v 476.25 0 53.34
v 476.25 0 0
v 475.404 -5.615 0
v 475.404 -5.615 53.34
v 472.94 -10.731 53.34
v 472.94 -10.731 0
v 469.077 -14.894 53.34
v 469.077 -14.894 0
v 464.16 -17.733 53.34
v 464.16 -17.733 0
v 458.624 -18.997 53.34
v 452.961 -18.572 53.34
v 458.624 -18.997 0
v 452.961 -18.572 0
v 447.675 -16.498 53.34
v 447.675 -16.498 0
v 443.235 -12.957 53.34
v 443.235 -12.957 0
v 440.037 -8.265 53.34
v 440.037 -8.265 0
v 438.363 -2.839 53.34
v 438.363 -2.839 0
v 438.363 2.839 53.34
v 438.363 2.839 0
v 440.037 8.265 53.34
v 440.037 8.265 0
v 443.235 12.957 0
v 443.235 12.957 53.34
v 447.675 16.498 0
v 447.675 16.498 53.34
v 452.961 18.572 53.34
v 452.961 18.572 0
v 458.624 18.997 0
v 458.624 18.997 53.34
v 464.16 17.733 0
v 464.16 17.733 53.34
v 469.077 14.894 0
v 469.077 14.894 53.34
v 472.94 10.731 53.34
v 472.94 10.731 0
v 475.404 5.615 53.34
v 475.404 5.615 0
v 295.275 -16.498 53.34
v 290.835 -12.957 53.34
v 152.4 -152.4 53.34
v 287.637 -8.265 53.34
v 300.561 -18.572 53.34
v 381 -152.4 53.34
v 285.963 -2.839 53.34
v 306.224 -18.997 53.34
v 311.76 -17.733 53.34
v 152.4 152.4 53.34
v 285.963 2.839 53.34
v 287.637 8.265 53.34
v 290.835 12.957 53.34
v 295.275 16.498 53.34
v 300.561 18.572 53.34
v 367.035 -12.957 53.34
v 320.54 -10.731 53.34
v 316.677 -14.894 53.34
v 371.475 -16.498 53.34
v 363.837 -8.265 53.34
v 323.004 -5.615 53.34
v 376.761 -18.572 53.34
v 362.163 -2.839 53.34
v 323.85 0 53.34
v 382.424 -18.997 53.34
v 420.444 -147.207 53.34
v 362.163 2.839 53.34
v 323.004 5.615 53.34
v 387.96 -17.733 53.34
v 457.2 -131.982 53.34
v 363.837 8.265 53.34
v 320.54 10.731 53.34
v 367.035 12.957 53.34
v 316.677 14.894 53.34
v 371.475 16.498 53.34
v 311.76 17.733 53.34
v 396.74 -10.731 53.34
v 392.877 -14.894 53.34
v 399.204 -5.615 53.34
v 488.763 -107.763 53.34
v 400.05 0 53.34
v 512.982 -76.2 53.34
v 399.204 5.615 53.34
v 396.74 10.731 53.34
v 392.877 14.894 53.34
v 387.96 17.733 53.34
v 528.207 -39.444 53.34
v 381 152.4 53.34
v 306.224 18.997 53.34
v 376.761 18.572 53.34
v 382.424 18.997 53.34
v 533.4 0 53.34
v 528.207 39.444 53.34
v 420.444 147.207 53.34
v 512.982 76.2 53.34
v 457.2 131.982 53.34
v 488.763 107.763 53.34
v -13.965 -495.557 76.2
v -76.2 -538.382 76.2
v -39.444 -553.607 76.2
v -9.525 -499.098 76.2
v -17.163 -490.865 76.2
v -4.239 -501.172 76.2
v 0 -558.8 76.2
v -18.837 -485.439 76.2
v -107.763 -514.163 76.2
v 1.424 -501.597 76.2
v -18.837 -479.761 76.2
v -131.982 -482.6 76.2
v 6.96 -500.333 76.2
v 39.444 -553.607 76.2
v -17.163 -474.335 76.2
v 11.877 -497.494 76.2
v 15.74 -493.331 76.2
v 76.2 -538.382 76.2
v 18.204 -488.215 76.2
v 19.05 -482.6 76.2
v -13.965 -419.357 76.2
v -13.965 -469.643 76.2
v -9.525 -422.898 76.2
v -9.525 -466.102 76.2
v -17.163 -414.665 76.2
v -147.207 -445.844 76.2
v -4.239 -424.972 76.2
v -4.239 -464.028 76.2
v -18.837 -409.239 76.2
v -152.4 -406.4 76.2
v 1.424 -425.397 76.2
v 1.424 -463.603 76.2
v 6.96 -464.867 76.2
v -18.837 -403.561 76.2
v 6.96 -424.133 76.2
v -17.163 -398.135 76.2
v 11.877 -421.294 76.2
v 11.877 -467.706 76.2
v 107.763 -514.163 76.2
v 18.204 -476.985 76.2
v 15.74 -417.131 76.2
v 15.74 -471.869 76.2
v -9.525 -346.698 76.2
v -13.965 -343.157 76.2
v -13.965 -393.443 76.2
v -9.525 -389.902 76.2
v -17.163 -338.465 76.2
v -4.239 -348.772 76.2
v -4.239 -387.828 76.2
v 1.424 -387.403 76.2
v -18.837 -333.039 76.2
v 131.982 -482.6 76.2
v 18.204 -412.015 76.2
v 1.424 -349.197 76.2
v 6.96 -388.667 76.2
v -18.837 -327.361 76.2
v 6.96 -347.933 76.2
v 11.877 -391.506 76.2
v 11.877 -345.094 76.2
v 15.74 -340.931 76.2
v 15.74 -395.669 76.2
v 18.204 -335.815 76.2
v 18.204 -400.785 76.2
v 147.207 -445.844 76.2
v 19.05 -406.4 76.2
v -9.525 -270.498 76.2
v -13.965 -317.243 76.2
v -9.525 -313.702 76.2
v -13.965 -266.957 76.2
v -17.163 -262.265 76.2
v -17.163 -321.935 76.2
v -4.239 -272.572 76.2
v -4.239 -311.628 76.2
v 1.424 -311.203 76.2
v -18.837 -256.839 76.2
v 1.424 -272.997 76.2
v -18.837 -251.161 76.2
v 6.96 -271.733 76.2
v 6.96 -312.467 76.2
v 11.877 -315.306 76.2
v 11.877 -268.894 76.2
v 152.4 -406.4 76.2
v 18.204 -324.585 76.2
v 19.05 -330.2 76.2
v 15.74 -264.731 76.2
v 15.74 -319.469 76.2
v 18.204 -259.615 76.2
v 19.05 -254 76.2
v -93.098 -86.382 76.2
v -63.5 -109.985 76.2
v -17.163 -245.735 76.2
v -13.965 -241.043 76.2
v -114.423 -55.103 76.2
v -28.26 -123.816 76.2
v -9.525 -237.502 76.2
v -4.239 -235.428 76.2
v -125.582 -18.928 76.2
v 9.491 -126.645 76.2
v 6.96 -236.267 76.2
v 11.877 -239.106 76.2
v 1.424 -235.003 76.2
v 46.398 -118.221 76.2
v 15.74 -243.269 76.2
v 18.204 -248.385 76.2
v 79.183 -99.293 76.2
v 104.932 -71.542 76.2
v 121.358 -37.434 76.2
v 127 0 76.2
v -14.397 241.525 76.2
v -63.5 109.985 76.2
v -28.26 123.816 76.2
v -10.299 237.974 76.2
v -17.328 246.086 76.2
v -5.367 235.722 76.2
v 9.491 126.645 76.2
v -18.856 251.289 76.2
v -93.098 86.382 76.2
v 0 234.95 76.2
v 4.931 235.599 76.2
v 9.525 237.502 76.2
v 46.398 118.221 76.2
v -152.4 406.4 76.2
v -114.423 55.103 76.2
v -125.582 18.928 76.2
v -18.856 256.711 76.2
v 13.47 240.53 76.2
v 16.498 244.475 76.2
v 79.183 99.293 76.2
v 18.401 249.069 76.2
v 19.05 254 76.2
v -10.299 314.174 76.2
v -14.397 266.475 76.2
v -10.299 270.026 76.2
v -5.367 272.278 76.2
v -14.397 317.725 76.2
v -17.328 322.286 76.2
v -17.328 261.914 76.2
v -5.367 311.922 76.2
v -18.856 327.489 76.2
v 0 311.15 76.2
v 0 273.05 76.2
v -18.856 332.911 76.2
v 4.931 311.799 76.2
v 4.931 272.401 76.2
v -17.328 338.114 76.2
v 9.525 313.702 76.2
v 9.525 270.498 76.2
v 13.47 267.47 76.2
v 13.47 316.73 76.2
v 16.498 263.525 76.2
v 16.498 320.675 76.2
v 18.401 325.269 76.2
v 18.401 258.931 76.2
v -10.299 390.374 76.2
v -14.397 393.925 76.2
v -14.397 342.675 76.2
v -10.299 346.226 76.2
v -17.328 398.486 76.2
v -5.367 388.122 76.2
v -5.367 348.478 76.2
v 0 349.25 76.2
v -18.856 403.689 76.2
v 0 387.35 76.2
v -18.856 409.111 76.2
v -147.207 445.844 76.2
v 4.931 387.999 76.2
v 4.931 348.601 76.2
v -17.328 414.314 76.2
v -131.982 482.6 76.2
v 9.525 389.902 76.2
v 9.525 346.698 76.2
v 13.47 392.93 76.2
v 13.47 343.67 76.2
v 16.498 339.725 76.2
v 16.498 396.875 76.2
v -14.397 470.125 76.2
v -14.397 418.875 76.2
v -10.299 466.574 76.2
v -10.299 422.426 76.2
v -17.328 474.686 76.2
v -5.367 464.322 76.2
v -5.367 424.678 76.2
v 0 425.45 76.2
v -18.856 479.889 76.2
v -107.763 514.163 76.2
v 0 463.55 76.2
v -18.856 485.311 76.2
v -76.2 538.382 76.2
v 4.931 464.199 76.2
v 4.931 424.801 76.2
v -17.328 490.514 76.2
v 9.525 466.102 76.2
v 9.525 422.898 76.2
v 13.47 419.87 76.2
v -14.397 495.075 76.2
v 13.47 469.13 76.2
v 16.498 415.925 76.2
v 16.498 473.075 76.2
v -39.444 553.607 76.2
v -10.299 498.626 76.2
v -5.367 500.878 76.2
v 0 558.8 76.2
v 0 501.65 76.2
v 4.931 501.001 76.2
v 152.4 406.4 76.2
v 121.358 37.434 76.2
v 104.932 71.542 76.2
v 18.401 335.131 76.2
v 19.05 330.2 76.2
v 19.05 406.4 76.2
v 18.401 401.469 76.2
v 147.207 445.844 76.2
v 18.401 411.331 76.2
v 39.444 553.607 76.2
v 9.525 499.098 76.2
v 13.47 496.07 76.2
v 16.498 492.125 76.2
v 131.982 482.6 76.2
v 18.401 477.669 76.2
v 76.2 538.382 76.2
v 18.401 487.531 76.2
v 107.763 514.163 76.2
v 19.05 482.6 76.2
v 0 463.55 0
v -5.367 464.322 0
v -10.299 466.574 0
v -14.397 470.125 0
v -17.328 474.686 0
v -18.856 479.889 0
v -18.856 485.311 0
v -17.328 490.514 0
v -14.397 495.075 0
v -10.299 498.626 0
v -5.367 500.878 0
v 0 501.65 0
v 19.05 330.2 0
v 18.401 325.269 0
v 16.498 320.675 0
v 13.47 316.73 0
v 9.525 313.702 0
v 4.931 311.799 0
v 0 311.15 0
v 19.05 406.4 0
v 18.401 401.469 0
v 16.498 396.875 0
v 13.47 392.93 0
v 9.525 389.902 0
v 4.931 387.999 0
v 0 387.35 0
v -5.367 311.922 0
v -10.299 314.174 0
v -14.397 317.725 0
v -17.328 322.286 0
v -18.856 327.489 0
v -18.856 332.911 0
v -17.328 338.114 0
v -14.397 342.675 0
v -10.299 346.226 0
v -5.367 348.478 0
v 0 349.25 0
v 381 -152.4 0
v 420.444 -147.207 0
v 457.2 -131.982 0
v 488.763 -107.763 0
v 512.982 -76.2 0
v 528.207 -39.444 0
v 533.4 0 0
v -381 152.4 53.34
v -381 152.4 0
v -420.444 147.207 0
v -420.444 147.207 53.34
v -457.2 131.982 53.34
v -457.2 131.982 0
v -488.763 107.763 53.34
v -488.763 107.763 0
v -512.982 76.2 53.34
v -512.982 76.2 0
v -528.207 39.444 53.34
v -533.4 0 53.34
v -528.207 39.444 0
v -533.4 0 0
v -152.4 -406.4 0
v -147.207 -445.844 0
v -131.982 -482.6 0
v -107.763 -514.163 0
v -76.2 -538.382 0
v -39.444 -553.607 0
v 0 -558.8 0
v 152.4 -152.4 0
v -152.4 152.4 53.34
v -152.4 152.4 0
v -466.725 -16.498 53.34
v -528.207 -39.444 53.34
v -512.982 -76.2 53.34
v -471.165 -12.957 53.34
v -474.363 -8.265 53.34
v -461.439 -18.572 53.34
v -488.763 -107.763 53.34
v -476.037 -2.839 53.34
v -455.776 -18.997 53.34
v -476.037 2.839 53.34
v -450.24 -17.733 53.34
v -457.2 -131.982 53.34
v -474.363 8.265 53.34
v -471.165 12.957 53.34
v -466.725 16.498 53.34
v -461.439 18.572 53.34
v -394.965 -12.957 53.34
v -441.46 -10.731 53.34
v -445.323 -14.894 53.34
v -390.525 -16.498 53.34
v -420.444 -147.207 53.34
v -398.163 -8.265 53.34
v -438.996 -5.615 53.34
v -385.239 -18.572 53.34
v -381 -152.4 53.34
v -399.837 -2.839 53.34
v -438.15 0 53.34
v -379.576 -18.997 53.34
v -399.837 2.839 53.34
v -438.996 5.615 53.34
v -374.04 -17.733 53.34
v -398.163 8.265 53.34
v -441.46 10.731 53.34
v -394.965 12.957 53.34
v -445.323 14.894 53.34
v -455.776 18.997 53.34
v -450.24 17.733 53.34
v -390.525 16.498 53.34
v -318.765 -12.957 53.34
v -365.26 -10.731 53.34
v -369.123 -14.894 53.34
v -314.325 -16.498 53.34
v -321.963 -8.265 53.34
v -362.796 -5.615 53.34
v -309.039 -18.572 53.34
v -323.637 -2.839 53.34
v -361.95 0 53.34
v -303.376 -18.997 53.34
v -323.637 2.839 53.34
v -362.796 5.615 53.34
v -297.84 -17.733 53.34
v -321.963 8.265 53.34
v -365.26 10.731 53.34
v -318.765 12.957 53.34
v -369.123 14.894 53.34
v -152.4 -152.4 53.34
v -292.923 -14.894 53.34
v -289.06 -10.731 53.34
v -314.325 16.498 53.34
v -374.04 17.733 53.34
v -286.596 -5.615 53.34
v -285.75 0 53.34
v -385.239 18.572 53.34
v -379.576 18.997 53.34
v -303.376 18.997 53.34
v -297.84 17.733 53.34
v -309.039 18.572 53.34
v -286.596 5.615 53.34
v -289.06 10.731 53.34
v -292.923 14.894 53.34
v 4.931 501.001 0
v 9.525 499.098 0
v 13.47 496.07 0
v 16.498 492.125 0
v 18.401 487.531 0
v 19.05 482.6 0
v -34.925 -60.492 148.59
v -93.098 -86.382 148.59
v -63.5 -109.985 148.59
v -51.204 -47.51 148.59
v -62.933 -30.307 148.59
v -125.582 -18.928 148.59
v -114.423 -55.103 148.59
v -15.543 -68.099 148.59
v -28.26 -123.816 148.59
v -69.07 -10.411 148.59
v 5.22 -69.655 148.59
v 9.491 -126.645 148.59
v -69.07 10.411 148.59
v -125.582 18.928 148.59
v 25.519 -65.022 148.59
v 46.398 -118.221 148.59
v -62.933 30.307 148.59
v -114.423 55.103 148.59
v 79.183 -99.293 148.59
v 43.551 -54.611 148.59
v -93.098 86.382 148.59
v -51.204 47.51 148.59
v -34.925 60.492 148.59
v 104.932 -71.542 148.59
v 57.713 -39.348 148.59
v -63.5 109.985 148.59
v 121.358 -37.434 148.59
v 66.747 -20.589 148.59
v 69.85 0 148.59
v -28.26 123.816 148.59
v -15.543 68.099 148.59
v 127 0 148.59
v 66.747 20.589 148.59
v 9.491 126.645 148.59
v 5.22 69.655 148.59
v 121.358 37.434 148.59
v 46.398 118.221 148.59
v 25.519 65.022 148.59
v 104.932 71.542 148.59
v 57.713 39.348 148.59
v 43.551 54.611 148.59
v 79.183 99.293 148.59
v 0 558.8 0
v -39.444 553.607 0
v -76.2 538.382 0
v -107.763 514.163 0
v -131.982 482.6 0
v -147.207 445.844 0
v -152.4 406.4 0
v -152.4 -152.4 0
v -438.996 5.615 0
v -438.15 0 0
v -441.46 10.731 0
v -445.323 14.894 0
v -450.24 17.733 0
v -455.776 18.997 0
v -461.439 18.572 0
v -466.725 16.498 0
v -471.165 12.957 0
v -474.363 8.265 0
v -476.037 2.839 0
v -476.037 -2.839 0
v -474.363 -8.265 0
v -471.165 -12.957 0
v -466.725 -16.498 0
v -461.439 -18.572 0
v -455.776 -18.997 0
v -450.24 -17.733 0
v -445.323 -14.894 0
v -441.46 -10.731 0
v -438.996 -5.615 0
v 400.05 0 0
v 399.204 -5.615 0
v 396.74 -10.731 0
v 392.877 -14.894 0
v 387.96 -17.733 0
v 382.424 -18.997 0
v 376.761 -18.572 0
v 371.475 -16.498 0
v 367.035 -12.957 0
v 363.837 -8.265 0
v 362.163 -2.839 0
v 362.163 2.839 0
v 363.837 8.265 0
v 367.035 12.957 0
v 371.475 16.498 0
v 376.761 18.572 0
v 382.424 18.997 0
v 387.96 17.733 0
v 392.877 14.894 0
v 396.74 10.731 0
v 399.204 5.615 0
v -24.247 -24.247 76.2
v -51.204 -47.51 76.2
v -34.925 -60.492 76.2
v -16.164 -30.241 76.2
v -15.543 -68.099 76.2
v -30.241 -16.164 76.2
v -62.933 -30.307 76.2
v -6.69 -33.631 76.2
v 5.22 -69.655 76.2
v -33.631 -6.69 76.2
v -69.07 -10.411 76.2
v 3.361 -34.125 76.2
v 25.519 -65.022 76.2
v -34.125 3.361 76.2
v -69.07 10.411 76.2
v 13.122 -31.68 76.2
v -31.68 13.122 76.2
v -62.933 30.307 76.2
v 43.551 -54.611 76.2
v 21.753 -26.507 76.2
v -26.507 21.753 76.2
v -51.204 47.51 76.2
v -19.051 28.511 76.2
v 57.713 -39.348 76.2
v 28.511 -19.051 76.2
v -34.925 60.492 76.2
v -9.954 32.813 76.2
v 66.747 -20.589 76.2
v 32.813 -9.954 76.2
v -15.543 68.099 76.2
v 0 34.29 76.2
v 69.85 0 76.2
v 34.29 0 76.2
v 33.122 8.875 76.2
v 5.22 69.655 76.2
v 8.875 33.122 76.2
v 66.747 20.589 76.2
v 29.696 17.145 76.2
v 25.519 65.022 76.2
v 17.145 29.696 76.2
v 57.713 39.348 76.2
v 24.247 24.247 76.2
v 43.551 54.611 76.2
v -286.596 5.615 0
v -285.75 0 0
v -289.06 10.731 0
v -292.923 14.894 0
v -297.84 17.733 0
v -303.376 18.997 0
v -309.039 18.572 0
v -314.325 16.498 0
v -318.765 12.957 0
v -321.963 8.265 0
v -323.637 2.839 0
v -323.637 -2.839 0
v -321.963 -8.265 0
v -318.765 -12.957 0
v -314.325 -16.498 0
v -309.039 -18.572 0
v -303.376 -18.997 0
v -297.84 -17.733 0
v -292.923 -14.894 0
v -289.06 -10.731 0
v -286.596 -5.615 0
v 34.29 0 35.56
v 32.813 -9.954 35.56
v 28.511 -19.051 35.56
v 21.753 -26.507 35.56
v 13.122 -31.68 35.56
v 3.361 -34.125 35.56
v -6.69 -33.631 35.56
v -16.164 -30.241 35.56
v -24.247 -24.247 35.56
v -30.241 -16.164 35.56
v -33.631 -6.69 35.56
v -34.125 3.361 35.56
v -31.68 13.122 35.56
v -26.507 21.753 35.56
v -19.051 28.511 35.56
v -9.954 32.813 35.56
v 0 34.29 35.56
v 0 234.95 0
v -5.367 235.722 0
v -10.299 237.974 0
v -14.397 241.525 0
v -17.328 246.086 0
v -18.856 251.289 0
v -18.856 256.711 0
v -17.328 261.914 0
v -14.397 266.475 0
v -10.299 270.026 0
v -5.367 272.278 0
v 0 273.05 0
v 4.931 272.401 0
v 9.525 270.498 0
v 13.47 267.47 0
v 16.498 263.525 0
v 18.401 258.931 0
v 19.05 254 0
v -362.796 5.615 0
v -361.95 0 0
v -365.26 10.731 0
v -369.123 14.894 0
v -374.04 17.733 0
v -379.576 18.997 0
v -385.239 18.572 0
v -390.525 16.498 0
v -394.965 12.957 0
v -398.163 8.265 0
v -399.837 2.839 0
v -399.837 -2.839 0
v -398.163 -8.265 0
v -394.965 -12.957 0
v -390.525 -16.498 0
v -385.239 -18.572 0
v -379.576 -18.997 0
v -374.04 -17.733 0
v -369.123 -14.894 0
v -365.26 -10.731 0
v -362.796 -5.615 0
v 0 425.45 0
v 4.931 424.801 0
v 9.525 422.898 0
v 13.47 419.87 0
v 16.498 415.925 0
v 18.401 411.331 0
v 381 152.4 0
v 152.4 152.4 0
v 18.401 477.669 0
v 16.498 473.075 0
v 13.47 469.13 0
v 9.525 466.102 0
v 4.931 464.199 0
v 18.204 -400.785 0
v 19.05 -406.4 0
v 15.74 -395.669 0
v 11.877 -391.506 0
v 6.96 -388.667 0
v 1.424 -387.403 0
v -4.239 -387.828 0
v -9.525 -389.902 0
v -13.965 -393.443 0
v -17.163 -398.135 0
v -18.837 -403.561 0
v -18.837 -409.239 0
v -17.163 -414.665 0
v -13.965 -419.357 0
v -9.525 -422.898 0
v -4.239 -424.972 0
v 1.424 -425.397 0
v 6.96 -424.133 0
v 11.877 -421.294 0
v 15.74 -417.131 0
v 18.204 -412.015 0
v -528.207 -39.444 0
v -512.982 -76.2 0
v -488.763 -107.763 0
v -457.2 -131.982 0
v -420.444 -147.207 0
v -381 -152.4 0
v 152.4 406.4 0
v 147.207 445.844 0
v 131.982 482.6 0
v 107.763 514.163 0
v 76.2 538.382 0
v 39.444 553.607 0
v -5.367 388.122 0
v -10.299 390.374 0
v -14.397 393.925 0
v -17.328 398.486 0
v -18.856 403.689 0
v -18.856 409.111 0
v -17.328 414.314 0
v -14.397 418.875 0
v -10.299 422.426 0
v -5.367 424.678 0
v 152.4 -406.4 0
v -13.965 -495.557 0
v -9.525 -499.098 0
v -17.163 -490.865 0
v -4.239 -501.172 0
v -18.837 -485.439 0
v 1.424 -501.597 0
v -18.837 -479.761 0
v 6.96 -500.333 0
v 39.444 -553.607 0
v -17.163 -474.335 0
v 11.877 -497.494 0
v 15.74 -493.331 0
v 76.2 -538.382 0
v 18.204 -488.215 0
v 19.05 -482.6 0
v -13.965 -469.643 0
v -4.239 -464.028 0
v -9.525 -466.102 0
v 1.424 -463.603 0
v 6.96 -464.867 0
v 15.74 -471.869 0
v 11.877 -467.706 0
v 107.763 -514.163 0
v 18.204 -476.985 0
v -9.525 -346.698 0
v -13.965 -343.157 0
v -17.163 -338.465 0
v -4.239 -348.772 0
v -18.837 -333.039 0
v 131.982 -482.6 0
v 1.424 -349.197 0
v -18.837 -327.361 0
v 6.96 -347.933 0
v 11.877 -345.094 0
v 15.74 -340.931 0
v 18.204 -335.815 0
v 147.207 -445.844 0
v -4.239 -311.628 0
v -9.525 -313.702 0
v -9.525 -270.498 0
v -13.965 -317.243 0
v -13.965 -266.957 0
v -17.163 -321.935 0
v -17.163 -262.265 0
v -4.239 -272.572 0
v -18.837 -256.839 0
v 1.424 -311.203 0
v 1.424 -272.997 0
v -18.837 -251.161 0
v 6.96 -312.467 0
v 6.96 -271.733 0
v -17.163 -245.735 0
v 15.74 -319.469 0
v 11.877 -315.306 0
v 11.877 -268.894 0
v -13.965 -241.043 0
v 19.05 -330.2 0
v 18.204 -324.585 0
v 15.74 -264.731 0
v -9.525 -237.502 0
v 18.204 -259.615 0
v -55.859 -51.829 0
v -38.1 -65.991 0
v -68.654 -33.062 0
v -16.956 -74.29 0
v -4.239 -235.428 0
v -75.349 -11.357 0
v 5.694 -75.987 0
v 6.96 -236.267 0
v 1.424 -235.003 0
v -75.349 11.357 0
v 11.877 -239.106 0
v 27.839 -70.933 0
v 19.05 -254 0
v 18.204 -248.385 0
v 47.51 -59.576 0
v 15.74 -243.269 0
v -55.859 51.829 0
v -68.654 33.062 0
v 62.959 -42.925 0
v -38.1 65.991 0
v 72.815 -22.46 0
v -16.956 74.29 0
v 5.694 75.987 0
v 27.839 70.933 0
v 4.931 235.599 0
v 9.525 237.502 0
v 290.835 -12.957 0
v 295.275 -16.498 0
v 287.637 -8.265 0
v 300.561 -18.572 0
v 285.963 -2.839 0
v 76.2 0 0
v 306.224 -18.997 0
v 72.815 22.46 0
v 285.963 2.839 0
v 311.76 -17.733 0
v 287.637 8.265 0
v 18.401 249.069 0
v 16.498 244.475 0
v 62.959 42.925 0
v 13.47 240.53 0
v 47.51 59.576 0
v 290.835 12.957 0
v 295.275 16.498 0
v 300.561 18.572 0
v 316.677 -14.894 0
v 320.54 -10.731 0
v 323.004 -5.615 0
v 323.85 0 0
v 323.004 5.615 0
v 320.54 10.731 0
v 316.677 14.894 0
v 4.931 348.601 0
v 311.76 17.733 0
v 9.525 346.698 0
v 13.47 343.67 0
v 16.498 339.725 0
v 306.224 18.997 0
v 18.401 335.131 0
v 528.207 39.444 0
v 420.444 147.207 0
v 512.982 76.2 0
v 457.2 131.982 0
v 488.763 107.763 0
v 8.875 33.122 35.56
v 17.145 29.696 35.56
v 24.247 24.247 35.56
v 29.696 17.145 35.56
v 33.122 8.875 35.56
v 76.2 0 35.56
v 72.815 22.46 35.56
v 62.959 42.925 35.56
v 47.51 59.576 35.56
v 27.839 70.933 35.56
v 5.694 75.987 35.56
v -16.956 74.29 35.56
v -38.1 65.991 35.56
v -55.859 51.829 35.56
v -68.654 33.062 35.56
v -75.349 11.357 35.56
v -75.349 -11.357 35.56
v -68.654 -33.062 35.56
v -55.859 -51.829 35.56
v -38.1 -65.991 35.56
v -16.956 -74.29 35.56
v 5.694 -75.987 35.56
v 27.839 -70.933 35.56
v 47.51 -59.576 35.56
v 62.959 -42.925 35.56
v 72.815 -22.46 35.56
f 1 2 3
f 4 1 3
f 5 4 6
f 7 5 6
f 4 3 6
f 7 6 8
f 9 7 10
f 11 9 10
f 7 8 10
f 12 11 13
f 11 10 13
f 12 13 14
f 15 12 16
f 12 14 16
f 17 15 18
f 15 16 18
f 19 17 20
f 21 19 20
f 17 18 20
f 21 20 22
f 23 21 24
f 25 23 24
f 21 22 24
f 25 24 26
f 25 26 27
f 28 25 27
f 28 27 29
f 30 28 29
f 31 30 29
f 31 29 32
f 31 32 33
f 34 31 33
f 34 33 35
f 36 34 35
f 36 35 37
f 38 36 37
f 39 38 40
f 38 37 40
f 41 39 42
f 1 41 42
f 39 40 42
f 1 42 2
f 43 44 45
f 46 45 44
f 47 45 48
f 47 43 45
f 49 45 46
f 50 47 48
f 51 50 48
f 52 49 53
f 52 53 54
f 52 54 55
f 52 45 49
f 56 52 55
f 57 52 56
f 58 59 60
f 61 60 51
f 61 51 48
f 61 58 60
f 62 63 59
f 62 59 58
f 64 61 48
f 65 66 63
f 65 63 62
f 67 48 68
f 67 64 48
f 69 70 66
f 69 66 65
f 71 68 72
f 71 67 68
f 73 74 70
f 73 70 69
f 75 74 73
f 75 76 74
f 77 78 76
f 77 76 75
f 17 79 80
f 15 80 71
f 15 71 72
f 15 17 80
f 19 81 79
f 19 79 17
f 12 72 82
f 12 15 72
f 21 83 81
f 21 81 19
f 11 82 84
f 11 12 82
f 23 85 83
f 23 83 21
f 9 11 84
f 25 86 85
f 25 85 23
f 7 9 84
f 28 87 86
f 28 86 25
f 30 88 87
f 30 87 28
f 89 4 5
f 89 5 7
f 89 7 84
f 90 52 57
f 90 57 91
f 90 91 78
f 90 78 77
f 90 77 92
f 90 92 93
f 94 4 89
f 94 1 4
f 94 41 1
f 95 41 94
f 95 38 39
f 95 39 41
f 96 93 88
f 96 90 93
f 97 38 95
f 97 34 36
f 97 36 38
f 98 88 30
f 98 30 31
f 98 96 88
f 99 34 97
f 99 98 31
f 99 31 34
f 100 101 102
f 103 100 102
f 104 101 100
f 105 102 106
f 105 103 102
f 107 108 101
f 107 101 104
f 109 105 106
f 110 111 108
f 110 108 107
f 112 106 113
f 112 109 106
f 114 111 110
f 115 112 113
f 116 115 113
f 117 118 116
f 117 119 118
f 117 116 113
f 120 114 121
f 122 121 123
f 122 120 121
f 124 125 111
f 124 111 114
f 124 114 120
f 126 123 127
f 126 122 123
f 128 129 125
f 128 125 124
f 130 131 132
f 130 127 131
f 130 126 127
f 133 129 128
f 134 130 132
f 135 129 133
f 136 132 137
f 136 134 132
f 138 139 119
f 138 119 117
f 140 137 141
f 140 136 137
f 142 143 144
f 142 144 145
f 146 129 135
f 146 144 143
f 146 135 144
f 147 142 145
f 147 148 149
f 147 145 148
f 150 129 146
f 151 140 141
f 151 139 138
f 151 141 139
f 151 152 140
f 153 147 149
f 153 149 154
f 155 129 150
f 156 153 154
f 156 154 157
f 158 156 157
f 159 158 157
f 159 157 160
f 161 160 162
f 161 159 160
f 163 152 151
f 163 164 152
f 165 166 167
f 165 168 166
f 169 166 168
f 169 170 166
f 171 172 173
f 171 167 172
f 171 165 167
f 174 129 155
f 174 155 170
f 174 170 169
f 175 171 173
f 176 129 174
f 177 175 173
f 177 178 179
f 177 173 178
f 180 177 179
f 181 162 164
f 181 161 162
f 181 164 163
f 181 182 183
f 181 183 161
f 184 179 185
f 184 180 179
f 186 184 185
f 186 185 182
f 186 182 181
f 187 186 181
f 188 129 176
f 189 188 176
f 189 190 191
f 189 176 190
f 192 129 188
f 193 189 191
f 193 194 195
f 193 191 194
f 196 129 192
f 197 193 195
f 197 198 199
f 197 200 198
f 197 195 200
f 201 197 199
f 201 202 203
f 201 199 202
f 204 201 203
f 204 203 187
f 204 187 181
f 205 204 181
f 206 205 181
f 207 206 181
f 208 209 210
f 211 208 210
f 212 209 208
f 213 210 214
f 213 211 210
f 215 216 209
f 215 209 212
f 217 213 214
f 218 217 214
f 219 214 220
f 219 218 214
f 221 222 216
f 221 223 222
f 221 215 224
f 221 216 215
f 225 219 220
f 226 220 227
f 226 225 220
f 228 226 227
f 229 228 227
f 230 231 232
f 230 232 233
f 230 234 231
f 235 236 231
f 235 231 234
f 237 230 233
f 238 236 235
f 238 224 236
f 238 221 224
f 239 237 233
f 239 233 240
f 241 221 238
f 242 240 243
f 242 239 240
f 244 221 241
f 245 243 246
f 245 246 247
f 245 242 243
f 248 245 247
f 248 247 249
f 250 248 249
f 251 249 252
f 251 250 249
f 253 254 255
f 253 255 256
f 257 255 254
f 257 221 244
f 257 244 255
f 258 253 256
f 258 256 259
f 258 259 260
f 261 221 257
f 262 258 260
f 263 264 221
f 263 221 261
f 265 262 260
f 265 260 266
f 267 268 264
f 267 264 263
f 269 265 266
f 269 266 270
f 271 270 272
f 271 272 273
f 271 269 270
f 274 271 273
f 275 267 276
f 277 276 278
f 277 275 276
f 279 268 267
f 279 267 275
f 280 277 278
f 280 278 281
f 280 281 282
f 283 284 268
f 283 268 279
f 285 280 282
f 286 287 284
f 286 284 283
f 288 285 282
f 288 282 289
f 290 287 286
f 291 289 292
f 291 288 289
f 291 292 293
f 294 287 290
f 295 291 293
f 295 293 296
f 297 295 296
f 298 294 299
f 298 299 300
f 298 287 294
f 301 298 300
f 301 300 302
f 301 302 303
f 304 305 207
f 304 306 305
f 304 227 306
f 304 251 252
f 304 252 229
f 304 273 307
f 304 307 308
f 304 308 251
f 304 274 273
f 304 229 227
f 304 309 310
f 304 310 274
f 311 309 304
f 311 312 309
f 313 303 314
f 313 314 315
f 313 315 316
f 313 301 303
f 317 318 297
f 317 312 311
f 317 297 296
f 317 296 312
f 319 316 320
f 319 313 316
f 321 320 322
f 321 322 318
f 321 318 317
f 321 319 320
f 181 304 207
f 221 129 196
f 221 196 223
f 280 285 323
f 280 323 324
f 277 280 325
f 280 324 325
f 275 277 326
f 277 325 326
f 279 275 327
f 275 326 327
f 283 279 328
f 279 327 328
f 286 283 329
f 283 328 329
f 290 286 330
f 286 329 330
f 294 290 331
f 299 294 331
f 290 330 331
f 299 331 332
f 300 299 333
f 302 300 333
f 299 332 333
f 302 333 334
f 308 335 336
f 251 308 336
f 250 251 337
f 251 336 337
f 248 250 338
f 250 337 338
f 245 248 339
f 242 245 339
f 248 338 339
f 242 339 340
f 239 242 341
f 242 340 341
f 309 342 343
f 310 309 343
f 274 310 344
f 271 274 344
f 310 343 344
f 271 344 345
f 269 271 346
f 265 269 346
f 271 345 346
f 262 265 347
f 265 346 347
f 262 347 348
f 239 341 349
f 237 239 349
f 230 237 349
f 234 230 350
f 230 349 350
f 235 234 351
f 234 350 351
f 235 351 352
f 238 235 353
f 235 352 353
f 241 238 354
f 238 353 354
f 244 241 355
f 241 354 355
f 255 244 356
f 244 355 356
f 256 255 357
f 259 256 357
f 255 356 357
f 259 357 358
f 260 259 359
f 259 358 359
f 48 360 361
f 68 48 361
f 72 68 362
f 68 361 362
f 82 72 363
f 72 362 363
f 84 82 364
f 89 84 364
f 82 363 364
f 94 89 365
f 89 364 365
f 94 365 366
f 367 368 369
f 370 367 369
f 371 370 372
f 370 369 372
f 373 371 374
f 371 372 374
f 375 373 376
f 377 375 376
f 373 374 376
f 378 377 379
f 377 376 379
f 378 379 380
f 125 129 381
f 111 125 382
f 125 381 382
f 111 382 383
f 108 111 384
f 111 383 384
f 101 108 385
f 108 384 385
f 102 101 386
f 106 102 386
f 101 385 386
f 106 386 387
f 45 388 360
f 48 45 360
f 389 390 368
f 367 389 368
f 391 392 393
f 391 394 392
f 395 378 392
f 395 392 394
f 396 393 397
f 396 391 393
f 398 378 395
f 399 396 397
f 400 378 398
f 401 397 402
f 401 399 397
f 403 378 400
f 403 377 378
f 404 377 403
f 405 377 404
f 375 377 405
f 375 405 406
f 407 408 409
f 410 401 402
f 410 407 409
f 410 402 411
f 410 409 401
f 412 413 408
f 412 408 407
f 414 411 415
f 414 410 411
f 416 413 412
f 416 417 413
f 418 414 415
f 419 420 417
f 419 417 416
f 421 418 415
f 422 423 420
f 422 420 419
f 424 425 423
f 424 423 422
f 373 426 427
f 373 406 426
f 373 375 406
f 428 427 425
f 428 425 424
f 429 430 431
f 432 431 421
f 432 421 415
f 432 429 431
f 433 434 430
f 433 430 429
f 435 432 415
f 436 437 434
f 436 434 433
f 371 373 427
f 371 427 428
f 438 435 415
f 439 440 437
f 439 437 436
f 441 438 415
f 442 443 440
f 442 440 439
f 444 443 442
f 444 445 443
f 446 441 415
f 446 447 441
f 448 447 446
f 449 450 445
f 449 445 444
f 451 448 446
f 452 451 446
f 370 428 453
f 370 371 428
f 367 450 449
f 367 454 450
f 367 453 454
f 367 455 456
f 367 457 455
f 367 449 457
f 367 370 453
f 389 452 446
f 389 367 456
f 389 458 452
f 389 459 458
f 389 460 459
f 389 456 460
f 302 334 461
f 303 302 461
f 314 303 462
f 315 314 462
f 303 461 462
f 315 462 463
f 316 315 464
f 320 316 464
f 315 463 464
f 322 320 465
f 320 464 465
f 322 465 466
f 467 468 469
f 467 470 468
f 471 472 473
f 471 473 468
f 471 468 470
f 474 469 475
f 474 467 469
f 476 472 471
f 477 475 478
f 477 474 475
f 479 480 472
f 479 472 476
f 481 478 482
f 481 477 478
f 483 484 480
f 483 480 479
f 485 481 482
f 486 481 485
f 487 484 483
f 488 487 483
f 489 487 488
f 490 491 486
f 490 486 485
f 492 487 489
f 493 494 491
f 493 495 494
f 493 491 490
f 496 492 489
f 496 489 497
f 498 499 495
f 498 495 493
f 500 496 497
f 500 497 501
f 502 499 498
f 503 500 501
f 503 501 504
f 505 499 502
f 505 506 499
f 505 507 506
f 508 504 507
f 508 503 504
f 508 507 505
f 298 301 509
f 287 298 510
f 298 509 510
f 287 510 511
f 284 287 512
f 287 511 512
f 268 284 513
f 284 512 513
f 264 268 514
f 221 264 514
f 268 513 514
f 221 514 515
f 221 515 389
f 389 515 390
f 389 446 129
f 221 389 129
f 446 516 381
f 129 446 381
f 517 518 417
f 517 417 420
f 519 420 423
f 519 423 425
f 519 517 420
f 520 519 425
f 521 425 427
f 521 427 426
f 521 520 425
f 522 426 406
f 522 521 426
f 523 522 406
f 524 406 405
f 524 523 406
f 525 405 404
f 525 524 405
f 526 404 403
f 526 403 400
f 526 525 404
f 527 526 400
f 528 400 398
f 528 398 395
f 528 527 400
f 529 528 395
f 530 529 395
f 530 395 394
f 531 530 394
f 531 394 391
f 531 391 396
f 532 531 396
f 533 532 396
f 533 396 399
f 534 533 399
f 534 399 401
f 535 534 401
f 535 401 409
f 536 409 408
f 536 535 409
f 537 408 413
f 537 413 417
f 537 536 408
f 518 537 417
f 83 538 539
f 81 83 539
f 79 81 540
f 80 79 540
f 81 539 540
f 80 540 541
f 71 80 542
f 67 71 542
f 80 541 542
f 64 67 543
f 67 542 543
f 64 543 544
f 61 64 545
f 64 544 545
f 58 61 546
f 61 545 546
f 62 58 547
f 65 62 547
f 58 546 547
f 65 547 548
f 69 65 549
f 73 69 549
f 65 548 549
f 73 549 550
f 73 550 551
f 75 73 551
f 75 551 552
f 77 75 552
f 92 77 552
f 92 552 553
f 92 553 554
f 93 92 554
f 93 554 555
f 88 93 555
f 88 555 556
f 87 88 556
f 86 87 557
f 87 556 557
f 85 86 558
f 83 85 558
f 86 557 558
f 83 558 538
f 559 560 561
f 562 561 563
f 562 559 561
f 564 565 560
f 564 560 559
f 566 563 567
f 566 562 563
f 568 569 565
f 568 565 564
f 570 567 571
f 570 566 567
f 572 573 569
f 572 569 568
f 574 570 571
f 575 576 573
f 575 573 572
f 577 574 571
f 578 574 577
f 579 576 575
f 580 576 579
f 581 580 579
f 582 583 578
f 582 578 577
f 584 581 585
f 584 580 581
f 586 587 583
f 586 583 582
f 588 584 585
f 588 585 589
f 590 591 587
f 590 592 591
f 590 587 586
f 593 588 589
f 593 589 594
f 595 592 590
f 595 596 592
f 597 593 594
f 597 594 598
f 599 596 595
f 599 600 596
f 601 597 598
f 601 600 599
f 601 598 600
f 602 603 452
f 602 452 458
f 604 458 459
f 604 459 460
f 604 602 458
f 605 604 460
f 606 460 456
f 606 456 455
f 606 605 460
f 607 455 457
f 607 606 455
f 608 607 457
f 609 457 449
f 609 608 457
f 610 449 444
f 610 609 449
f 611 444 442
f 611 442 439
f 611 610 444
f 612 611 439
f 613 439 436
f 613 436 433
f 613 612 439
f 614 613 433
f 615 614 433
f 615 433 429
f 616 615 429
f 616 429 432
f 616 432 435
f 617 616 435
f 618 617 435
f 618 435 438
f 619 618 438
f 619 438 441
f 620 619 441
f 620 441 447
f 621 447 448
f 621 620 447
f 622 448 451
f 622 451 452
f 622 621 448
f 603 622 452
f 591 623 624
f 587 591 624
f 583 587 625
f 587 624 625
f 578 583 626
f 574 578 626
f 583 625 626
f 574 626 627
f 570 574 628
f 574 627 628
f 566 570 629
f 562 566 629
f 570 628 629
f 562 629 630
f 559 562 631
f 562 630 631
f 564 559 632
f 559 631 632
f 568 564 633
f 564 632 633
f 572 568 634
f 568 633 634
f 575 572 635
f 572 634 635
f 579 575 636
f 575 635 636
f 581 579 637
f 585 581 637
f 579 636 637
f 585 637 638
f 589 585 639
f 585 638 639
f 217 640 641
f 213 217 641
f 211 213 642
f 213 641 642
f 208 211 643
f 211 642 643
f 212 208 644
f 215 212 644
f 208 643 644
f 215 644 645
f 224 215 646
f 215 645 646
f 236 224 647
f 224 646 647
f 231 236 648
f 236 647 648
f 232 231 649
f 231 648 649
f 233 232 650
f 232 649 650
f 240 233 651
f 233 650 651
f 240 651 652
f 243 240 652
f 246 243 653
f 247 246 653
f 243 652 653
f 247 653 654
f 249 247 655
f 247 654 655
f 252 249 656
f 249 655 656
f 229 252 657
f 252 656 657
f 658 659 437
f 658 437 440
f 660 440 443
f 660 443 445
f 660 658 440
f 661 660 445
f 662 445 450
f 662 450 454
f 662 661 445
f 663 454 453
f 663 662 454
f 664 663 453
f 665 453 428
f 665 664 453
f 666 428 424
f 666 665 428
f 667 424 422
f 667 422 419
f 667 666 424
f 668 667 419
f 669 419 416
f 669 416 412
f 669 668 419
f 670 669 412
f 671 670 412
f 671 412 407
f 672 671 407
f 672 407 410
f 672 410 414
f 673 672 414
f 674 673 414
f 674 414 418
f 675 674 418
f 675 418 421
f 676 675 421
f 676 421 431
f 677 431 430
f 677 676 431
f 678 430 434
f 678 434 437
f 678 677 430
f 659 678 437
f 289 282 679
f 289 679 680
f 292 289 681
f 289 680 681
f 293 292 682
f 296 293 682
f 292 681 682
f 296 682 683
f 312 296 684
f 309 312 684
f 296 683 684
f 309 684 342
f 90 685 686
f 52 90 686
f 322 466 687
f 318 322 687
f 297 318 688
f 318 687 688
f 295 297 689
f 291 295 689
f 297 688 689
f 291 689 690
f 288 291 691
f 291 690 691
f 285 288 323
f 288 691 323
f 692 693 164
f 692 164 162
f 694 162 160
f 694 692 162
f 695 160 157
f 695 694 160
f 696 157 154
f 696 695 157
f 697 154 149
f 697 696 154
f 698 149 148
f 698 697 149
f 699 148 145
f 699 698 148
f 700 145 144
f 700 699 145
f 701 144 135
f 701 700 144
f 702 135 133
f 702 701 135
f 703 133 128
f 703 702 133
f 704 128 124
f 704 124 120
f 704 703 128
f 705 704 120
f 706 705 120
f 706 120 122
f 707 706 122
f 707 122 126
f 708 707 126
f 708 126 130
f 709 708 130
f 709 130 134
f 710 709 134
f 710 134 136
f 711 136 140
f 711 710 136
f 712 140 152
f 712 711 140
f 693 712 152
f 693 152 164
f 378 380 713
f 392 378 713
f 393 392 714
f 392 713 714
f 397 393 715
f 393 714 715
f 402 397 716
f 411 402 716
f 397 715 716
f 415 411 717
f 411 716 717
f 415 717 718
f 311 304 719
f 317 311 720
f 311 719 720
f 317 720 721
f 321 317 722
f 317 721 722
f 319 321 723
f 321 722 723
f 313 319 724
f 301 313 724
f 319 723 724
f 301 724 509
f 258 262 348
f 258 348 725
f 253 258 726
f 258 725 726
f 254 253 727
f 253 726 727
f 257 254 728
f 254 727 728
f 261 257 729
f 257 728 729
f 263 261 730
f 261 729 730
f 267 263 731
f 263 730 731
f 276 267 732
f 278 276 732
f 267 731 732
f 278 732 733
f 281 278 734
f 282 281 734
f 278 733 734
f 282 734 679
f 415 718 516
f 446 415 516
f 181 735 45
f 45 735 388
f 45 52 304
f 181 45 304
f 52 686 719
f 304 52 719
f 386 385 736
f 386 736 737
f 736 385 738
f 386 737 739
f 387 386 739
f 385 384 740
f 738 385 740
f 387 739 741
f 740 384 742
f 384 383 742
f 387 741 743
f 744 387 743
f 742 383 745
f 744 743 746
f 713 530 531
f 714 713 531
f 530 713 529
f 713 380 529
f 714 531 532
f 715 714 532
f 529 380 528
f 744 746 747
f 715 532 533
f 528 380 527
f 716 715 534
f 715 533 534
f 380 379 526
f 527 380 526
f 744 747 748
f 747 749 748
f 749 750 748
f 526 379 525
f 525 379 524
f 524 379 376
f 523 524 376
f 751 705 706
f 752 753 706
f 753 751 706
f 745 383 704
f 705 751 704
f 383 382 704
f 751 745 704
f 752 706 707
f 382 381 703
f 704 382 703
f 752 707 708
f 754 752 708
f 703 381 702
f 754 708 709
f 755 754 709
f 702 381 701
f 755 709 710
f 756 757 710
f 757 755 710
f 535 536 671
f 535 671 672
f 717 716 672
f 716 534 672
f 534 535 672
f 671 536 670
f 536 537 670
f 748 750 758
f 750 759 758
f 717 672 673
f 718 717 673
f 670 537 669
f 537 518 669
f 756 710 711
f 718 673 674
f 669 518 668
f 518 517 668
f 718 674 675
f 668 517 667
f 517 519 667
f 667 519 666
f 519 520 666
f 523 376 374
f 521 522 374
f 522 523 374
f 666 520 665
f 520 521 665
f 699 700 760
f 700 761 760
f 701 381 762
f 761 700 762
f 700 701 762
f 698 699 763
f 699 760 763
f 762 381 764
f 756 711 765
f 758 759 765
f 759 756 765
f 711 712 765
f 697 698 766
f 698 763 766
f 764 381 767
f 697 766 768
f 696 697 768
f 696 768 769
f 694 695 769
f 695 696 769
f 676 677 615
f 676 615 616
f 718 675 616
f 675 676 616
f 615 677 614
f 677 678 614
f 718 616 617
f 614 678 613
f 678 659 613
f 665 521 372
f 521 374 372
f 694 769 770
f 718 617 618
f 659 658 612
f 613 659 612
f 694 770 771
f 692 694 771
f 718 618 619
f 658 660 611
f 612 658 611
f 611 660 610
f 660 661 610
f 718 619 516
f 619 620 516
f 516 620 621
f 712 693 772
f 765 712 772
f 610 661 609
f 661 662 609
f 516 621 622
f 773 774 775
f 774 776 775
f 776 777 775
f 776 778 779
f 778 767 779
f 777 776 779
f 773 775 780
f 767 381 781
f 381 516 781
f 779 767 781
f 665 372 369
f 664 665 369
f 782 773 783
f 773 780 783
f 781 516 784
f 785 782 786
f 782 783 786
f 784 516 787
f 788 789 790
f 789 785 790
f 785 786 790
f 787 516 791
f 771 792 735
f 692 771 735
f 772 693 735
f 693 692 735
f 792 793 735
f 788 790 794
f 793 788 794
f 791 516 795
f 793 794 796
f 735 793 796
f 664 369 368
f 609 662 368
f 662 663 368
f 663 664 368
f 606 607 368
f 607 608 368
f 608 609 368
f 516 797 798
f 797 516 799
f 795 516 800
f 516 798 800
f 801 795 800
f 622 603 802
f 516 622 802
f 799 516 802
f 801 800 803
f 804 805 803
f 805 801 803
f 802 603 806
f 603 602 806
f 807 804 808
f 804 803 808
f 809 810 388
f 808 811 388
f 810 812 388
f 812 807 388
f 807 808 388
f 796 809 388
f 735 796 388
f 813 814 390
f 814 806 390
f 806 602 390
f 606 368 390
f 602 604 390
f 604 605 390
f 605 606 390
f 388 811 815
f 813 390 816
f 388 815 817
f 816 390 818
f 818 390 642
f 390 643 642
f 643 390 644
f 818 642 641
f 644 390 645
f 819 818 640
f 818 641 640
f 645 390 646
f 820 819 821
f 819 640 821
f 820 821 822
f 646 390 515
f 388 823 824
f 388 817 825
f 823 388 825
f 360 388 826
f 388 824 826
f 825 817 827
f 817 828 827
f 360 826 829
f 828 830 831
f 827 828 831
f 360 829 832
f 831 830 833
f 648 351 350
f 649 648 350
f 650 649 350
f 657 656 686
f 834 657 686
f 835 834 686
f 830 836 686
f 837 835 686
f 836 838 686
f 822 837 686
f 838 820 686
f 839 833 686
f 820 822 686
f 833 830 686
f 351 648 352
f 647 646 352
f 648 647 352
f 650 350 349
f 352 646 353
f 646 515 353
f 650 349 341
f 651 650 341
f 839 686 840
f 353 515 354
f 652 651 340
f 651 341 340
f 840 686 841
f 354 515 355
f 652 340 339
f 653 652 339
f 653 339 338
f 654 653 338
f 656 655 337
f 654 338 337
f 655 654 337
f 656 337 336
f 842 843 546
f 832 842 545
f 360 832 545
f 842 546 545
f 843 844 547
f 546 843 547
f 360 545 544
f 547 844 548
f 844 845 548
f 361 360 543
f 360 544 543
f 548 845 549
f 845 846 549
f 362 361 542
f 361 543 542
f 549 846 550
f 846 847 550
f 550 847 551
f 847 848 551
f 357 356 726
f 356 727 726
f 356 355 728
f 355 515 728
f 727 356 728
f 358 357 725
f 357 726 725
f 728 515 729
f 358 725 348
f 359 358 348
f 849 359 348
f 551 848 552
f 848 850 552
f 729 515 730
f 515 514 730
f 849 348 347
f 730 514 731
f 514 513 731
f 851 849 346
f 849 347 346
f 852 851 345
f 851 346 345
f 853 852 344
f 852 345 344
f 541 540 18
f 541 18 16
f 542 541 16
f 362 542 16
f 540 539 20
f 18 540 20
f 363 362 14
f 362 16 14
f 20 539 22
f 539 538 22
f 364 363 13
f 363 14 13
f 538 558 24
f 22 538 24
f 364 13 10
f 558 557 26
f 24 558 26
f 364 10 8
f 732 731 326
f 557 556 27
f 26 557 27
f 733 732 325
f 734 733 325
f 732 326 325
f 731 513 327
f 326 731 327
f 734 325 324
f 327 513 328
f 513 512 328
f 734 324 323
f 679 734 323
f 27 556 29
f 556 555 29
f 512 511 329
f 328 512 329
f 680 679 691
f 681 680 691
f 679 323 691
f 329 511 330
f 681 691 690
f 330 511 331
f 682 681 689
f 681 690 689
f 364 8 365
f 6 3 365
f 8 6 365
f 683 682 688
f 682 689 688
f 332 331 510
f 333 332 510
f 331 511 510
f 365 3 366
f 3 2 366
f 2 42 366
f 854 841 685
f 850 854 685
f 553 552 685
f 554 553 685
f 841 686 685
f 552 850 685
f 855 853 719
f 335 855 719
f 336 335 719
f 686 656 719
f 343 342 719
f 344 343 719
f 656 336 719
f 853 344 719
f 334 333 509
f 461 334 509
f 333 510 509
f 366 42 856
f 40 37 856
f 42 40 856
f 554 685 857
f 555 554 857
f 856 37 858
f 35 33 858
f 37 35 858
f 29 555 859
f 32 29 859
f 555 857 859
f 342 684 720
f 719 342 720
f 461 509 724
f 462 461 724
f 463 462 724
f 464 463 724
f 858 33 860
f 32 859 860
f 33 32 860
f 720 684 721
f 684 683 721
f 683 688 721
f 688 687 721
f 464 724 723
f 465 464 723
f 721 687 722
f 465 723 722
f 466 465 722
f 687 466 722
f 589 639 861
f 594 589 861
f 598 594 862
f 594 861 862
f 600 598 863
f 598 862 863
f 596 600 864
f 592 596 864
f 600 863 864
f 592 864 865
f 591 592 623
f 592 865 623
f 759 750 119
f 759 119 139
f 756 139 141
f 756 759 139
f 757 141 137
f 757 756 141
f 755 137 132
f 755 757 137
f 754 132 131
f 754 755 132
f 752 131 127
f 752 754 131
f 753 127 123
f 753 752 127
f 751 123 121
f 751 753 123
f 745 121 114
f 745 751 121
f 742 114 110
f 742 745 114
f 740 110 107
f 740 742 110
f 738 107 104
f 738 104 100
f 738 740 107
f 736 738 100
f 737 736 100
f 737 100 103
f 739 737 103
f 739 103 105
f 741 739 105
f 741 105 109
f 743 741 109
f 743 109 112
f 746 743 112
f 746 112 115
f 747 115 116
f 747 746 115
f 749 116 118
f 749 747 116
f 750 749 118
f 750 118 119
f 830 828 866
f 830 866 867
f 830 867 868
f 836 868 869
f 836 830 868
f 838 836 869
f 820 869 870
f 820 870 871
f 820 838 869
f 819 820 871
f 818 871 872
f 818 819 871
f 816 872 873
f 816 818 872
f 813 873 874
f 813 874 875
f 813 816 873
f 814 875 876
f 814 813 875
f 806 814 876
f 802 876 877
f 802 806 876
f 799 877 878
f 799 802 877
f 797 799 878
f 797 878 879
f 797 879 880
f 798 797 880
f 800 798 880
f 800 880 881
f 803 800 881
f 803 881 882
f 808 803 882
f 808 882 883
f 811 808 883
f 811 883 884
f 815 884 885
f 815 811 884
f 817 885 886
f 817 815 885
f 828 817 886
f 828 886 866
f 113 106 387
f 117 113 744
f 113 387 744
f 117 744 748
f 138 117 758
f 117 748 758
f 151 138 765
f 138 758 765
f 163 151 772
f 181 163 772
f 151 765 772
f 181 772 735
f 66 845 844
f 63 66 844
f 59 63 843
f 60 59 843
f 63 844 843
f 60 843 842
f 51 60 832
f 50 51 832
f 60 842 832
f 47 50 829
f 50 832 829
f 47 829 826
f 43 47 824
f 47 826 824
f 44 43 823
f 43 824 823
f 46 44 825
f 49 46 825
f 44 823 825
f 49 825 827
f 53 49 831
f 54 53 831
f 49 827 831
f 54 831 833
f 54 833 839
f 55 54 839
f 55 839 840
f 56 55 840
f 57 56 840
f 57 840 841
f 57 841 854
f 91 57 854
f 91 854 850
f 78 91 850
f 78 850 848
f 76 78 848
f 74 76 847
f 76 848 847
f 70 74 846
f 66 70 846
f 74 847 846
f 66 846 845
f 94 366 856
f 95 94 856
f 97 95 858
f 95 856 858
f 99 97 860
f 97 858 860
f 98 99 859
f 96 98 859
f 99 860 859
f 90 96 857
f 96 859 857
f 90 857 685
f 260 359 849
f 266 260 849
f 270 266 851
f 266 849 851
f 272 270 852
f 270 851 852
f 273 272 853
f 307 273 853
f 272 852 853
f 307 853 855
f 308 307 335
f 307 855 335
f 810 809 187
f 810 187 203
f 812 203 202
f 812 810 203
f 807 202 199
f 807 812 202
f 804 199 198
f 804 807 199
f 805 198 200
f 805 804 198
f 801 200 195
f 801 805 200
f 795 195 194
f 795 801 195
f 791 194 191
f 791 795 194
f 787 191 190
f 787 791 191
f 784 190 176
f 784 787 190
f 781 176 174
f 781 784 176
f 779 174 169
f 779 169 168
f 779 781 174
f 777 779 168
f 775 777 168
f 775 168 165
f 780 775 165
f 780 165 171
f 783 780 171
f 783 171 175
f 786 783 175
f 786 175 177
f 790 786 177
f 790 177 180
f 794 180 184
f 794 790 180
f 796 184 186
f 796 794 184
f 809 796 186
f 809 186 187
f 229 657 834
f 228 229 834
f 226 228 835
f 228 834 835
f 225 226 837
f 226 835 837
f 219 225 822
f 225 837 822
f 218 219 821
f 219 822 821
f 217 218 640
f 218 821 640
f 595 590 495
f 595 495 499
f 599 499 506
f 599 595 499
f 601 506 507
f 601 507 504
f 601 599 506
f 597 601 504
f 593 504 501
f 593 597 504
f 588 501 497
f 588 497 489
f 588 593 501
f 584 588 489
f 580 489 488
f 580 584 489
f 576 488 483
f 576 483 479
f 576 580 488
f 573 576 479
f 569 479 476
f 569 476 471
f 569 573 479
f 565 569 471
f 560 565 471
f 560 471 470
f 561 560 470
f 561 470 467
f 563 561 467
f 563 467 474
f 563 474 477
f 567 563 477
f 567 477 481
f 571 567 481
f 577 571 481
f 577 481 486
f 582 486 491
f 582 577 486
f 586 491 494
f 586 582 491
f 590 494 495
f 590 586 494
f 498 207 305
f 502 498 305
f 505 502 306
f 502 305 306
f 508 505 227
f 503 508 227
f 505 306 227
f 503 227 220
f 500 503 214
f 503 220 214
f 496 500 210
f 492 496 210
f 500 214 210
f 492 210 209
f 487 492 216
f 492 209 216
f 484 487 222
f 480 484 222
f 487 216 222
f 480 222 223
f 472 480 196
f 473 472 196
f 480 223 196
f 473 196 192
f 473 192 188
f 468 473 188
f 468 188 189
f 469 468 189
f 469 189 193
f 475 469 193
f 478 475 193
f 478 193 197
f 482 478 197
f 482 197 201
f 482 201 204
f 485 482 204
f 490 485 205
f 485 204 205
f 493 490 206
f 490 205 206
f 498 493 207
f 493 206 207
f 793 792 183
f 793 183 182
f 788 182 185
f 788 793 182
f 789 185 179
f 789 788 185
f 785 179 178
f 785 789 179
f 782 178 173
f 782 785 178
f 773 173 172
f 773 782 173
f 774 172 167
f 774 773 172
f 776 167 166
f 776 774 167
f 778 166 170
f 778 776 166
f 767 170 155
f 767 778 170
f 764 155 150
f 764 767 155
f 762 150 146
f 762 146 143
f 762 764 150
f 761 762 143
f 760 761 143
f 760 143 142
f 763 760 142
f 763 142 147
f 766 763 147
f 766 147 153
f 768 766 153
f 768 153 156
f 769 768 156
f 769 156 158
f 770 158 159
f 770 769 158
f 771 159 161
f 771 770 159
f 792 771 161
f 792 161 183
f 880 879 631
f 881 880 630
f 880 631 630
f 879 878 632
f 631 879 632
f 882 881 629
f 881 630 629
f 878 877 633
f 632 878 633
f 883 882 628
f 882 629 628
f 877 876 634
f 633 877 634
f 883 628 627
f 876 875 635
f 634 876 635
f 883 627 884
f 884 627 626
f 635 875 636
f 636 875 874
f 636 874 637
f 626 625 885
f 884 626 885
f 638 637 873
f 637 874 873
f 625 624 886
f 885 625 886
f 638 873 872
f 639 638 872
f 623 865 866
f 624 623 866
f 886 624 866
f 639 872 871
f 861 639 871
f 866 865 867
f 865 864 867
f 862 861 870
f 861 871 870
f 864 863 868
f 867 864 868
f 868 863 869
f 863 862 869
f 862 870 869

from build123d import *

# Parameters (mm, degrees)
F0_R     = 19.05
F1_DEPTH = 76.2
F2_DEPTH = 53.34
F3_R     = 127
F3_R_2   = 69.85
F4_DEPTH = 72.39
F5_R     = 76.2
F6_DEPTH = 35.56


with BuildPart() as f1:
    # F0 (on Top) → F1 (new body)
    with BuildSketch(Plane.XY):
        with BuildLine():
            ThreePointArc((34.29, 0), (-24.246692, -24.246692), (0, 34.29))
            Line((0, 34.29), (0, 234.95))
            ThreePointArc((0, 234.95), (-19.05, 254), (0, 273.05))
            Line((0, 273.05), (0, 311.15))
            ThreePointArc((0, 311.15), (-19.05, 330.2), (0, 349.25))
            Line((0, 349.25), (0, 387.35))
            ThreePointArc((0, 387.35), (-19.05, 406.4), (0, 425.45))
            Line((0, 425.45), (0, 463.55))
            ThreePointArc((0, 463.55), (-19.05, 482.6), (0, 501.65))
            Line((0, 501.65), (0, 558.8))
            ThreePointArc((0, 558.8), (-107.763073, 514.163073), (-152.4, 406.4))
            Line((-152.4, 406.4), (-152.4, 152.4))
            Line((-152.4, 152.4), (-152.4, -152.4))
            Line((-152.4, -152.4), (-152.4, -406.4))
            ThreePointArc((-152.4, -406.4), (-107.763073, -514.163073), (0, -558.8))
            ThreePointArc((0, -558.8), (107.763073, -514.163073), (152.4, -406.4))
            Line((152.4, -406.4), (152.4, -152.4))
            Line((152.4, -152.4), (152.4, 0))
            Line((152.4, 0), (34.29, 0))
        make_face()
        with Locations((0, -482.6)):
            Circle(F0_R, mode=Mode.SUBTRACT)
        with Locations((0, -406.4)):
            Circle(F0_R, mode=Mode.SUBTRACT)
        with Locations((0, -330.2)):
            Circle(F0_R, mode=Mode.SUBTRACT)
        with Locations((0, -254)):
            Circle(F0_R, mode=Mode.SUBTRACT)
        with BuildLine():
            Line((0, 234.95), (0, 34.29))
            ThreePointArc((0, 34.29), (24.246692, 24.246692), (34.29, 0))
            Line((34.29, 0), (152.4, 0))
            Line((152.4, 0), (152.4, 152.4))
            Line((152.4, 152.4), (152.4, 406.4))
            ThreePointArc((152.4, 406.4), (107.763073, 514.163073), (0, 558.8))
            Line((0, 558.8), (0, 501.65))
            ThreePointArc((0, 501.65), (13.470384, 496.070384), (19.05, 482.6))
            ThreePointArc((19.05, 482.6), (13.470384, 469.129616), (0, 463.55))
            Line((0, 463.55), (0, 425.45))
            ThreePointArc((0, 425.45), (13.470384, 419.870384), (19.05, 406.4))
            ThreePointArc((19.05, 406.4), (13.470384, 392.929616), (0, 387.35))
            Line((0, 387.35), (0, 349.25))
            ThreePointArc((0, 349.25), (13.470384, 343.670384), (19.05, 330.2))
            ThreePointArc((19.05, 330.2), (13.470384, 316.729616), (0, 311.15))
            Line((0, 311.15), (0, 273.05))
            ThreePointArc((0, 273.05), (13.470384, 267.470384), (19.05, 254))
            ThreePointArc((19.05, 254), (13.470384, 240.529616), (0, 234.95))
        make_face()
    extrude(amount=F1_DEPTH)

    # F0 (on Top) → F2 (join)
    with BuildSketch(Plane.XY):
        with BuildLine():
            Line((-381, -152.4), (-152.4, -152.4))
            Line((-152.4, -152.4), (-152.4, 152.4))
            Line((-152.4, 152.4), (-381, 152.4))
            ThreePointArc((-381, 152.4), (-488.763073, 107.763073), (-533.4, 0))
            ThreePointArc((-533.4, 0), (-488.763073, -107.763073), (-381, -152.4))
        make_face()
        with Locations((-457.2, 0)):
            Circle(F0_R, mode=Mode.SUBTRACT)
        with Locations((-381, 0)):
            Circle(F0_R, mode=Mode.SUBTRACT)
        with Locations((-304.8, 0)):
            Circle(F0_R, mode=Mode.SUBTRACT)
        with BuildLine():
            Line((152.4, 152.4), (152.4, 0))
            Line((152.4, 0), (285.75, 0))
            ThreePointArc((285.75, 0), (304.8, 19.05), (323.85, 0))
            Line((323.85, 0), (361.95, 0))
            ThreePointArc((361.95, 0), (381, 19.05), (400.05, 0))
            Line((400.05, 0), (438.15, 0))
            ThreePointArc((438.15, 0), (457.2, 19.05), (476.25, 0))
            Line((476.25, 0), (533.4, 0))
            ThreePointArc((533.4, 0), (488.763073, 107.763073), (381, 152.4))
            Line((381, 152.4), (152.4, 152.4))
        make_face()
        with BuildLine():
            Line((285.75, 0), (152.4, 0))
            Line((152.4, 0), (152.4, -152.4))
            Line((152.4, -152.4), (381, -152.4))
            ThreePointArc((381, -152.4), (488.763073, -107.763073), (533.4, 0))
            Line((533.4, 0), (476.25, 0))
            ThreePointArc((476.25, 0), (457.2, -19.05), (438.15, 0))
            Line((438.15, 0), (400.05, 0))
            ThreePointArc((400.05, 0), (381, -19.05), (361.95, 0))
            Line((361.95, 0), (323.85, 0))
            ThreePointArc((323.85, 0), (304.8, -19.05), (285.75, 0))
        make_face()
    extrude(amount=F2_DEPTH)

    # F3 (on face) → F4 (join)
    with BuildSketch(Plane.XY.offset(76.2)):
        Circle(F3_R)
        Circle(F3_R_2, mode=Mode.SUBTRACT)
    extrude(amount=F4_DEPTH)

    # F5 (on face) → F6 (cut)
    with BuildSketch(Plane.XY):
        Circle(F5_R)
    extrude(amount=F6_DEPTH, mode=Mode.SUBTRACT)


solid = f1.part
